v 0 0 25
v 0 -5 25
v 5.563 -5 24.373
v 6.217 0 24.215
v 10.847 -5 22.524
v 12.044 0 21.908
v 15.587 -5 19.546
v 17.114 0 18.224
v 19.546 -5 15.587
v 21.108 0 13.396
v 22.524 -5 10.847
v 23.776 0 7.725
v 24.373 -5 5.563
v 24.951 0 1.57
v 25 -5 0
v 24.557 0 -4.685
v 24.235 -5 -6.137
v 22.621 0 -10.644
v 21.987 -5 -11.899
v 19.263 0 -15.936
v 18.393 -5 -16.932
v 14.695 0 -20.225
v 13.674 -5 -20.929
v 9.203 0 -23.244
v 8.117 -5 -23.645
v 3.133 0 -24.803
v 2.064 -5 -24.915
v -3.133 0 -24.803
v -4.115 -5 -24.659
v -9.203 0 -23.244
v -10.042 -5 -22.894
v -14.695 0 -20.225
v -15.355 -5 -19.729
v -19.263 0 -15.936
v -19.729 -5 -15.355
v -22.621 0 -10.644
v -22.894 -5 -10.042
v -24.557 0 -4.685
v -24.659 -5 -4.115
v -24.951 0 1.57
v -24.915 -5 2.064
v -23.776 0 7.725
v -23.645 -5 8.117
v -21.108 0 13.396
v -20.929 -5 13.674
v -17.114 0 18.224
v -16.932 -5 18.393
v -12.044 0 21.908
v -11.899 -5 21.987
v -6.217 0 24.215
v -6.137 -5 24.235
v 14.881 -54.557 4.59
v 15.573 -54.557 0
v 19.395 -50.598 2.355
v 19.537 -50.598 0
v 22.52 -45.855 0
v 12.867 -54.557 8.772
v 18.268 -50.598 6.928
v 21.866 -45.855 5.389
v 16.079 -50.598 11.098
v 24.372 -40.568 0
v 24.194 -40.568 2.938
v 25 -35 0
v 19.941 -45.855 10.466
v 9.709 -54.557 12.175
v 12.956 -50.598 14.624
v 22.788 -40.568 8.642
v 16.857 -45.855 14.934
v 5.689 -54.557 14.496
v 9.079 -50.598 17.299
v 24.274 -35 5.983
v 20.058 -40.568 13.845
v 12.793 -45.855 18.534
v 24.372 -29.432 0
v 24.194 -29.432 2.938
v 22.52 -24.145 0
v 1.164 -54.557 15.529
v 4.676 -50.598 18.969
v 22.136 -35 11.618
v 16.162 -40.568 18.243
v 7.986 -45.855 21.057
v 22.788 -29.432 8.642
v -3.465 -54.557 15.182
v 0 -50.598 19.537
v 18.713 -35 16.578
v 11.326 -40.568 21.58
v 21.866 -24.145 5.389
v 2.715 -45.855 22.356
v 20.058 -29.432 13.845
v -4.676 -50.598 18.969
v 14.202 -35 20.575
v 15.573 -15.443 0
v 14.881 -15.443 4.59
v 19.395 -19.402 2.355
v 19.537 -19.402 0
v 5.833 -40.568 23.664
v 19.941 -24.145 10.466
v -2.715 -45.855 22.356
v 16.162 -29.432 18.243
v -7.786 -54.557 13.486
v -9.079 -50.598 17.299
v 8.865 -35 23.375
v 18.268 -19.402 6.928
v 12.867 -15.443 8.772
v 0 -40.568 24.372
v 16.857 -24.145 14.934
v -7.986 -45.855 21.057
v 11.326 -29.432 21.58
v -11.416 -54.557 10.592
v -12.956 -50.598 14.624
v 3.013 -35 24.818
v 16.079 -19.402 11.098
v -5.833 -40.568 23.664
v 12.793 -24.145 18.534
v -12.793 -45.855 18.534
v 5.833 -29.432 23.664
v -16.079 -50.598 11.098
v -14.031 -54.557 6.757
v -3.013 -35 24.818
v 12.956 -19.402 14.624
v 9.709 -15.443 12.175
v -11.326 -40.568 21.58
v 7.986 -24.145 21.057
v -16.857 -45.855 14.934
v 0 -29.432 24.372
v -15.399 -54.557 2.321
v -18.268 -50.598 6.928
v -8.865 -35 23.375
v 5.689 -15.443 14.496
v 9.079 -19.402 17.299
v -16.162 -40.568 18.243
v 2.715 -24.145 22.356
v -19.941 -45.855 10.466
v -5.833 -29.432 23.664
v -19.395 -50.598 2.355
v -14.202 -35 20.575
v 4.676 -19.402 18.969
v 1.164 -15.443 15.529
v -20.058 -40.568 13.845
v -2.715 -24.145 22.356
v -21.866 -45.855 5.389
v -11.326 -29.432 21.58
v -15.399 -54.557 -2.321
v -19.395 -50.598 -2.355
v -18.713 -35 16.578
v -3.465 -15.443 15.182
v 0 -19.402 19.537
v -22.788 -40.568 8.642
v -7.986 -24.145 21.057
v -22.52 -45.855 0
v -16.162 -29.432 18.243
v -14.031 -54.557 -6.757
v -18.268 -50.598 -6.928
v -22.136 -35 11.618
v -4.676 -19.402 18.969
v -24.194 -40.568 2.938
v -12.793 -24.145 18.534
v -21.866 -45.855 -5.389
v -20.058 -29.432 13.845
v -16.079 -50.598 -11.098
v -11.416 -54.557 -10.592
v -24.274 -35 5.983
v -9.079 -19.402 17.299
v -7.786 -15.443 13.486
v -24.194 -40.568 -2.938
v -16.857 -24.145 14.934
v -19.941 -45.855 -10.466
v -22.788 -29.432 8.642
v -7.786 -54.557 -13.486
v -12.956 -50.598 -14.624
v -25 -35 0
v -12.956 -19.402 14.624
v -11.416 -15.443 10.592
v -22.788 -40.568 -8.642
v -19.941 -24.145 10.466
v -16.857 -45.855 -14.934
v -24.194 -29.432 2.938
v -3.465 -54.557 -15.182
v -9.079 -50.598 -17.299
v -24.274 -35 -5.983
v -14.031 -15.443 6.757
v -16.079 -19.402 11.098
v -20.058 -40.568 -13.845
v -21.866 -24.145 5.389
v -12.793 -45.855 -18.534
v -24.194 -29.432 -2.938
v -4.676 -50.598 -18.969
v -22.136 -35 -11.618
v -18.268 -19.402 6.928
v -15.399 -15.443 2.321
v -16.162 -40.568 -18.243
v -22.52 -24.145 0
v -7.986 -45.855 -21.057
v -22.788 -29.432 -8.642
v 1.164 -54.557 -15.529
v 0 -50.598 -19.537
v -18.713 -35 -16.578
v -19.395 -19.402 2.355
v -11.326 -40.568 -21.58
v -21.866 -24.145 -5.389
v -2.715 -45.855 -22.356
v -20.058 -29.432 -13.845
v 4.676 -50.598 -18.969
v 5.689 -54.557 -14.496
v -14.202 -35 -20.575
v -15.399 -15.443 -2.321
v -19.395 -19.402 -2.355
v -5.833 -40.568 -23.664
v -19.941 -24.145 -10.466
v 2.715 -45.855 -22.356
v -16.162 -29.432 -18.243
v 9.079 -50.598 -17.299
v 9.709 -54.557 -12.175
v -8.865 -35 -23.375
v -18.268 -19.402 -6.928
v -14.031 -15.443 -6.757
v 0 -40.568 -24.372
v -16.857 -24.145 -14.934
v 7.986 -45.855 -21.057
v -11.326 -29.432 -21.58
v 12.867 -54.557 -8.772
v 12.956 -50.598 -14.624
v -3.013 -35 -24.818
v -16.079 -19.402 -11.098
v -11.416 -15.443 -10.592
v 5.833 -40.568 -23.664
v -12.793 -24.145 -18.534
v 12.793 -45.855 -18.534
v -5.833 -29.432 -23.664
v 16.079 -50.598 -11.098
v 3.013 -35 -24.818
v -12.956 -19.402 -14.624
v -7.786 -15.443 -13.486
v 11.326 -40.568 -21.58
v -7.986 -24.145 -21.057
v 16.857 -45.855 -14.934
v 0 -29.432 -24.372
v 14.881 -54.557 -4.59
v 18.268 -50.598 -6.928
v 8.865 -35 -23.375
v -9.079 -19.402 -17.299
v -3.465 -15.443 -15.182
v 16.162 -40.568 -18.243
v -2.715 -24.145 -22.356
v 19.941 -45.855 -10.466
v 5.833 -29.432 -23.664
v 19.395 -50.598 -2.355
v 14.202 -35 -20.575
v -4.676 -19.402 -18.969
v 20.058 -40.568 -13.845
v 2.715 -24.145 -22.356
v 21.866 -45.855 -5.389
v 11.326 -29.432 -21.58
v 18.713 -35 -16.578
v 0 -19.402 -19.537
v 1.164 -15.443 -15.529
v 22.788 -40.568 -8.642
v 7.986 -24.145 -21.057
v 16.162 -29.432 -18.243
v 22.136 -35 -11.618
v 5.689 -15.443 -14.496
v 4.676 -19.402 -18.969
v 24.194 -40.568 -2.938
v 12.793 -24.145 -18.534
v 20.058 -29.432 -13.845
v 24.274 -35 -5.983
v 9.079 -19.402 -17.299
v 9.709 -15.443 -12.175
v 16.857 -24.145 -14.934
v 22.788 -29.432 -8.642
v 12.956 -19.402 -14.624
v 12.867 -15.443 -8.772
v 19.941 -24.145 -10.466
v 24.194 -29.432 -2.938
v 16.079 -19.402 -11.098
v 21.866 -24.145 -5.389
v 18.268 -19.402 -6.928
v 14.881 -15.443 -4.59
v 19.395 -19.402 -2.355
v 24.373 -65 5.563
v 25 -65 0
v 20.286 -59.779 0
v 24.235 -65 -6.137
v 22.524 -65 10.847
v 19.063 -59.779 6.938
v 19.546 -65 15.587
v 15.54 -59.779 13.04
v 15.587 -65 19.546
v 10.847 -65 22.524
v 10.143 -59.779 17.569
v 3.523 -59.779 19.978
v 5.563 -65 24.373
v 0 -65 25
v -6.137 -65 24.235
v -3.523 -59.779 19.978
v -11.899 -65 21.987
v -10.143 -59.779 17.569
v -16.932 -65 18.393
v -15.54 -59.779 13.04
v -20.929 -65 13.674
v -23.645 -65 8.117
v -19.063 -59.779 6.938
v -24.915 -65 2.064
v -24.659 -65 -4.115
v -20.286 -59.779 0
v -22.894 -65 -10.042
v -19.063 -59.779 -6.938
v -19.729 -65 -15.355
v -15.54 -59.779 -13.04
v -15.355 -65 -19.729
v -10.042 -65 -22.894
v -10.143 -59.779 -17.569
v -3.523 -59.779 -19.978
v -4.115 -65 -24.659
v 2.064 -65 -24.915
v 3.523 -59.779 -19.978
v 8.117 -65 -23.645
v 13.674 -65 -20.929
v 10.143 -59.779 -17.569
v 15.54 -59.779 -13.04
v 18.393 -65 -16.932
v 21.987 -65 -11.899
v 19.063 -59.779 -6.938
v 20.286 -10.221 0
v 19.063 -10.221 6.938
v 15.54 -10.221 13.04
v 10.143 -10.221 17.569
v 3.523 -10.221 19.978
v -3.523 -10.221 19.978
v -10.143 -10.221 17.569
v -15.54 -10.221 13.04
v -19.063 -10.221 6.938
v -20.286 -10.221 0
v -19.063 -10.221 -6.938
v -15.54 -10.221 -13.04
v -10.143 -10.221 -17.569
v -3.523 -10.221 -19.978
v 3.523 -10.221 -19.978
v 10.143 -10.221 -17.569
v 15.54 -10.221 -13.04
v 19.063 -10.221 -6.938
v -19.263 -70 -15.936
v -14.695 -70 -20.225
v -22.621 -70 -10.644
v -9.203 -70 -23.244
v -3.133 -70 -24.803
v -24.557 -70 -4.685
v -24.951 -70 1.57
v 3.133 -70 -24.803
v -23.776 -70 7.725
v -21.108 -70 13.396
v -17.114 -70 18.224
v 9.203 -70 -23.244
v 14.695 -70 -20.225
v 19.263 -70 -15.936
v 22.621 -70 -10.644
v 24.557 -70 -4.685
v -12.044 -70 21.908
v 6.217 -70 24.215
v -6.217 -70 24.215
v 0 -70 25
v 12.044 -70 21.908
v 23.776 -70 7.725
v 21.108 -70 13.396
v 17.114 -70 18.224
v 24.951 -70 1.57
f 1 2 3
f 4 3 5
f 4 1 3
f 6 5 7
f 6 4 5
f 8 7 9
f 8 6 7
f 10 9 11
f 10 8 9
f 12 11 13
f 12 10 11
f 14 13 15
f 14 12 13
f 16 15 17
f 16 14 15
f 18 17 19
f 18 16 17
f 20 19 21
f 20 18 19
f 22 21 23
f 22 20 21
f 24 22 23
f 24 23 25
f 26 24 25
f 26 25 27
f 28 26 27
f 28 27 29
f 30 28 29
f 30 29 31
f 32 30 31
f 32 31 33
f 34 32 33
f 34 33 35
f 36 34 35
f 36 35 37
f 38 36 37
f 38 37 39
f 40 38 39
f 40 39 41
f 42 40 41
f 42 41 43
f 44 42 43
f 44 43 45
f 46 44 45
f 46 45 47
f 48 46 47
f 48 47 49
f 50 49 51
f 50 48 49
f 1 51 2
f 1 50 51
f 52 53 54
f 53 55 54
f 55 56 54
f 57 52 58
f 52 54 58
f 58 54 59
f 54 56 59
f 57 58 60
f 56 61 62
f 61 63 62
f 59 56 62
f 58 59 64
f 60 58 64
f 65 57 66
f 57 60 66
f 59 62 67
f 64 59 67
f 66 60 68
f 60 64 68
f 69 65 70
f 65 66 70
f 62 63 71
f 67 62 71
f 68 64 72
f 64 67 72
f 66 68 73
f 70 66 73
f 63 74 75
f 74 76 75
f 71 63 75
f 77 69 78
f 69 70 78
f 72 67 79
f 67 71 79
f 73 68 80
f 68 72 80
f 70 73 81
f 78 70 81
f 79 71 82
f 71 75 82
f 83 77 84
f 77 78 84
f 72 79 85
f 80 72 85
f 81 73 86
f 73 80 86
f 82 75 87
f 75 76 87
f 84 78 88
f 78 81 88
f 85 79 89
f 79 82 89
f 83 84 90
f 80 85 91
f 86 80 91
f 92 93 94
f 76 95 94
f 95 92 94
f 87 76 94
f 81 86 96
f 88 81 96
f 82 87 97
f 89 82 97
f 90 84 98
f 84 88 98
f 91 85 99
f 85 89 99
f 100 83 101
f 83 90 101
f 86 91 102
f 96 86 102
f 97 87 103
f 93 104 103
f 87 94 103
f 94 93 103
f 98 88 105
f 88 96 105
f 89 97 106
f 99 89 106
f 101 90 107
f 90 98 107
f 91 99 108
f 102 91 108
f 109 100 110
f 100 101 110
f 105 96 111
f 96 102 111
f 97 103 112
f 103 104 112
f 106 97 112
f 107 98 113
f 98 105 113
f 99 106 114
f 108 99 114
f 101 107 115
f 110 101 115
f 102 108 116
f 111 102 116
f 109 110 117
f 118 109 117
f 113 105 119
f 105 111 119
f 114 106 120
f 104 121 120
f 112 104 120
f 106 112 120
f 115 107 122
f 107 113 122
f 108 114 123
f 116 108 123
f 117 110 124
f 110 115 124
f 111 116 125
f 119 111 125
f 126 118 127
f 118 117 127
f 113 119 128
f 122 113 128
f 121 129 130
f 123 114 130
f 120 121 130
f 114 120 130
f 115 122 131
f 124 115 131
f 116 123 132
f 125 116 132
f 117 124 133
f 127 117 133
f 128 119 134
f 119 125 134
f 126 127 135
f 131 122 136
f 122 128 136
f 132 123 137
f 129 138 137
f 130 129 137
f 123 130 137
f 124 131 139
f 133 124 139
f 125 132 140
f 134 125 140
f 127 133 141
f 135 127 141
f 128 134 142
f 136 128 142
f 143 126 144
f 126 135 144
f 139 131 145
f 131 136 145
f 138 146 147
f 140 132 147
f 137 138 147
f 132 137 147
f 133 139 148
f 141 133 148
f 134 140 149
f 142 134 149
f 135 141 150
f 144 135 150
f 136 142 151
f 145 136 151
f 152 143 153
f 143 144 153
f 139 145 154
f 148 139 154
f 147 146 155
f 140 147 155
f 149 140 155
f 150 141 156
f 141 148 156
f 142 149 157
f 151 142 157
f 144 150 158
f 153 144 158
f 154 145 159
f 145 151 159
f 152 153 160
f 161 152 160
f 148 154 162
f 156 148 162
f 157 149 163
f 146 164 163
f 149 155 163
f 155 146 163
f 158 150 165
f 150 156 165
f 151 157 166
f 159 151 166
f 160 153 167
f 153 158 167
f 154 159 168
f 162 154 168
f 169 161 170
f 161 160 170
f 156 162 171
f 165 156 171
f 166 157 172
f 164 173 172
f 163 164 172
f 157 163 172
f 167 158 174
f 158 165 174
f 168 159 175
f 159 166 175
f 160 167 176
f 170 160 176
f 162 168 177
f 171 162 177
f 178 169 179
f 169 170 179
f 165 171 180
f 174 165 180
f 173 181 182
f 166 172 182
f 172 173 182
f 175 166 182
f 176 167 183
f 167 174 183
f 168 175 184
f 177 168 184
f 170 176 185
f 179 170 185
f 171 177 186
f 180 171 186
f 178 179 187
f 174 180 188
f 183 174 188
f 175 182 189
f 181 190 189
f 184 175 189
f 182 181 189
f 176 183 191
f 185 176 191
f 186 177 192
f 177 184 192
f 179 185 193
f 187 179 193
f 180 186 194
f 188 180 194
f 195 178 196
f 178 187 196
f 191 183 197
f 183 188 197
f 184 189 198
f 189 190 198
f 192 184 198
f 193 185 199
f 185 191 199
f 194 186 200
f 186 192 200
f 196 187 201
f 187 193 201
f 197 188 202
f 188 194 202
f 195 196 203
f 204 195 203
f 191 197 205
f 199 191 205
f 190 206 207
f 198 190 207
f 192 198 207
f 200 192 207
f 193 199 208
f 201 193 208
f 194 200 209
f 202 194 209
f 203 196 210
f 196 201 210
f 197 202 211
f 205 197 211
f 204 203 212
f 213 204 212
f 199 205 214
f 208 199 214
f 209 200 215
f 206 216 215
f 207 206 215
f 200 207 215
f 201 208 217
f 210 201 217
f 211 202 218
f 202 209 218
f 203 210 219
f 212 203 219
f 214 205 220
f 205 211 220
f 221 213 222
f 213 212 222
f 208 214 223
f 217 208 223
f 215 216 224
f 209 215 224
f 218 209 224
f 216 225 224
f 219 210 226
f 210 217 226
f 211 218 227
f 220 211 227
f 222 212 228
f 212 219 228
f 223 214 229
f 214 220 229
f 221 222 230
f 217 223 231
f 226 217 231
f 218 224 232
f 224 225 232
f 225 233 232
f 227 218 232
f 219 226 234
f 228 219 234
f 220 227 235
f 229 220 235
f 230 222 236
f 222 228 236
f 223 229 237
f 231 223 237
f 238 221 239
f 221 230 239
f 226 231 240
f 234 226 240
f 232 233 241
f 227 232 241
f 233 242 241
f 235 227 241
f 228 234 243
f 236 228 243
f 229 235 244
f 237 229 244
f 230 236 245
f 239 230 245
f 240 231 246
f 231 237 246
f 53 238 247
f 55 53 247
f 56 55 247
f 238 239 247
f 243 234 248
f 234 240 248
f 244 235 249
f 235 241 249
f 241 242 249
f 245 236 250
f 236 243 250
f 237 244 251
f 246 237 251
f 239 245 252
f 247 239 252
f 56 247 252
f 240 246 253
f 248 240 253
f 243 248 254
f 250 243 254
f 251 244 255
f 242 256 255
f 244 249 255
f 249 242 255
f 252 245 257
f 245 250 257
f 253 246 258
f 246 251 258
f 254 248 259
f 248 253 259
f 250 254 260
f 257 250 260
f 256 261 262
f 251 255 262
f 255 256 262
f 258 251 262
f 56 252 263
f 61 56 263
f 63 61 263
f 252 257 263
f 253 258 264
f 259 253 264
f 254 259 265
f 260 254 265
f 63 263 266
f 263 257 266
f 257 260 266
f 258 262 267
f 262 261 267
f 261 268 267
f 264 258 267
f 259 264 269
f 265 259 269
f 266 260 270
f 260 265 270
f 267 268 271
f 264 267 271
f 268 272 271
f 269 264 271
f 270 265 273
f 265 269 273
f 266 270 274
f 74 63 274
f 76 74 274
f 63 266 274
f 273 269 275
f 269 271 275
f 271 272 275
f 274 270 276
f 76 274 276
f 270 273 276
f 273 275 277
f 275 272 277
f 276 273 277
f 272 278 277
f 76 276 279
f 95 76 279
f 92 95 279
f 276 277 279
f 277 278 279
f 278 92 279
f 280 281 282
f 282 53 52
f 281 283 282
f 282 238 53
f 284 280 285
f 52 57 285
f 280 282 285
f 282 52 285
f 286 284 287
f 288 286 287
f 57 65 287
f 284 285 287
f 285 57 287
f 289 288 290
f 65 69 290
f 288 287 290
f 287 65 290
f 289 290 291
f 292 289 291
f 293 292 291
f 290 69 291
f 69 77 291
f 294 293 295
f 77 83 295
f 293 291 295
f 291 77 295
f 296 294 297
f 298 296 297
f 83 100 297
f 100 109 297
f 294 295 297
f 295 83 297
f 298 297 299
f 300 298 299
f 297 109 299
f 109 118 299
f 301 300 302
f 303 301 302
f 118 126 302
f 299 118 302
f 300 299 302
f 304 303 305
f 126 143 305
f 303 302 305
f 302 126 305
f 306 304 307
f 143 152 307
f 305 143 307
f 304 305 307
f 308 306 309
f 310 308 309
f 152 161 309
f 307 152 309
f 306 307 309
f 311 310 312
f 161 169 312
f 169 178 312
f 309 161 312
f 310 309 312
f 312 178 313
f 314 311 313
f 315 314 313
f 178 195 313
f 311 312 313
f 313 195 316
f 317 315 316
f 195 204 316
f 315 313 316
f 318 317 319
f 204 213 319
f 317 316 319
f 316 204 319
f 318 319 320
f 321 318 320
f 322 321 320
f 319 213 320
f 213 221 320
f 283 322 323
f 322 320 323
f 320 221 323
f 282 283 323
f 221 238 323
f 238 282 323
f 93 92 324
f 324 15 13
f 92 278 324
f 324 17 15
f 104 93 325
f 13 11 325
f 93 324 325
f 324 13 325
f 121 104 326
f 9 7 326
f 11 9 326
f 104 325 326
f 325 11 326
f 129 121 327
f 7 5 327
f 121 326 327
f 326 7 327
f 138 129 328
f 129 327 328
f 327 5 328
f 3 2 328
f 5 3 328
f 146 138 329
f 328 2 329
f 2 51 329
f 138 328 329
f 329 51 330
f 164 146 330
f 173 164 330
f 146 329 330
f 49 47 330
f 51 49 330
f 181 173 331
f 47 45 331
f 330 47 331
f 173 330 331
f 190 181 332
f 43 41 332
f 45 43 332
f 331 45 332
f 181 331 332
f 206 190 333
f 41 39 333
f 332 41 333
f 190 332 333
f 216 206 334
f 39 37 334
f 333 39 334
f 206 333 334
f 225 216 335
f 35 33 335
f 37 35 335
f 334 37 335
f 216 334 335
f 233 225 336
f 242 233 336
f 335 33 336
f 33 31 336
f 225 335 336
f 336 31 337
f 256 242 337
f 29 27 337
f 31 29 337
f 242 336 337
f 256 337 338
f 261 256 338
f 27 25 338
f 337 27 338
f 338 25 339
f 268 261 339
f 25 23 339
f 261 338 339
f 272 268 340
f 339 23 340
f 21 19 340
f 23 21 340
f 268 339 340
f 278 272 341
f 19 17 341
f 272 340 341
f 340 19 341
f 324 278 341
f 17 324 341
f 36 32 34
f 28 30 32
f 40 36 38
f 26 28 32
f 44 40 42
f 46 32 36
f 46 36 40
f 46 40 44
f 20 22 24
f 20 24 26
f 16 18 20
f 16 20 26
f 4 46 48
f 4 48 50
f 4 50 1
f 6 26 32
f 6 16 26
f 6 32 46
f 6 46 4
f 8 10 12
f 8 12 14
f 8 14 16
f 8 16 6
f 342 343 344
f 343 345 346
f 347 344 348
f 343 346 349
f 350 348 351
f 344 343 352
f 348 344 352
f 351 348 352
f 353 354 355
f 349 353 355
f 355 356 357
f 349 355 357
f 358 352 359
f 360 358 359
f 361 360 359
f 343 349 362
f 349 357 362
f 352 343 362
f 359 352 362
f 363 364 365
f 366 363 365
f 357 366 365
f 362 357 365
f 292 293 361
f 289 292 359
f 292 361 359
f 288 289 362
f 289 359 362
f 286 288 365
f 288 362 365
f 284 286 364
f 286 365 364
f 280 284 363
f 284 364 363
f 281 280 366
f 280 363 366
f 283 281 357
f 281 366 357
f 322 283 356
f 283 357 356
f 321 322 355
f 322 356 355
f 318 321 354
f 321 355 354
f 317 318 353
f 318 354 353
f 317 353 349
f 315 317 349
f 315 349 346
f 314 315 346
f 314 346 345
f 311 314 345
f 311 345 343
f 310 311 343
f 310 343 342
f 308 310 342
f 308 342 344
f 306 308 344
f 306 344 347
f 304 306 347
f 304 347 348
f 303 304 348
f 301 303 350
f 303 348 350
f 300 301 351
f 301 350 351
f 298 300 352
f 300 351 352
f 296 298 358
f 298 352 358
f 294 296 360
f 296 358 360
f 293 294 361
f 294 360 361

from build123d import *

# Parameters (mm, degrees)
SKETCH_1_R      = 25
EXTRUDE_1_DEPTH = 5


with BuildPart() as part:
    # 草图1 → 凸台-拉伸1 (new body)
    with BuildSketch(Plane(origin=(0, 0, 0), x_dir=(1, 0, 0), z_dir=(0, 1, 0))):
        with Locations(Location((0, 0, 0), (0, 0, 270))):
            Circle(SKETCH_1_R)
    extrude_1 = extrude(amount=-EXTRUDE_1_DEPTH)

    # 草图9 → 旋转20 (revolve)
    with BuildSketch(Plane.XY):
        with BuildLine():
            Line((15.572827559, -15.442724069), (25, -5))
            Line((25, -5), (0, -5))
            Line((0, -5), (0, -65))
            Line((0, -65), (25, -65))
            Line((25, -65), (15.572827559, -54.557275931))
            ThreePointArc((15.572827559, -54.557275931), (25, -35), (15.572827559, -15.442724069))
        make_face()
    revolve(axis=Axis((0, 51.125830707, 0), (0, -1, 0)))

    # 镜向1: 凸台-拉伸1 across plane
    add(extrude_1.mirror(Plane.ZX.offset(-35)))


solid = part.part
